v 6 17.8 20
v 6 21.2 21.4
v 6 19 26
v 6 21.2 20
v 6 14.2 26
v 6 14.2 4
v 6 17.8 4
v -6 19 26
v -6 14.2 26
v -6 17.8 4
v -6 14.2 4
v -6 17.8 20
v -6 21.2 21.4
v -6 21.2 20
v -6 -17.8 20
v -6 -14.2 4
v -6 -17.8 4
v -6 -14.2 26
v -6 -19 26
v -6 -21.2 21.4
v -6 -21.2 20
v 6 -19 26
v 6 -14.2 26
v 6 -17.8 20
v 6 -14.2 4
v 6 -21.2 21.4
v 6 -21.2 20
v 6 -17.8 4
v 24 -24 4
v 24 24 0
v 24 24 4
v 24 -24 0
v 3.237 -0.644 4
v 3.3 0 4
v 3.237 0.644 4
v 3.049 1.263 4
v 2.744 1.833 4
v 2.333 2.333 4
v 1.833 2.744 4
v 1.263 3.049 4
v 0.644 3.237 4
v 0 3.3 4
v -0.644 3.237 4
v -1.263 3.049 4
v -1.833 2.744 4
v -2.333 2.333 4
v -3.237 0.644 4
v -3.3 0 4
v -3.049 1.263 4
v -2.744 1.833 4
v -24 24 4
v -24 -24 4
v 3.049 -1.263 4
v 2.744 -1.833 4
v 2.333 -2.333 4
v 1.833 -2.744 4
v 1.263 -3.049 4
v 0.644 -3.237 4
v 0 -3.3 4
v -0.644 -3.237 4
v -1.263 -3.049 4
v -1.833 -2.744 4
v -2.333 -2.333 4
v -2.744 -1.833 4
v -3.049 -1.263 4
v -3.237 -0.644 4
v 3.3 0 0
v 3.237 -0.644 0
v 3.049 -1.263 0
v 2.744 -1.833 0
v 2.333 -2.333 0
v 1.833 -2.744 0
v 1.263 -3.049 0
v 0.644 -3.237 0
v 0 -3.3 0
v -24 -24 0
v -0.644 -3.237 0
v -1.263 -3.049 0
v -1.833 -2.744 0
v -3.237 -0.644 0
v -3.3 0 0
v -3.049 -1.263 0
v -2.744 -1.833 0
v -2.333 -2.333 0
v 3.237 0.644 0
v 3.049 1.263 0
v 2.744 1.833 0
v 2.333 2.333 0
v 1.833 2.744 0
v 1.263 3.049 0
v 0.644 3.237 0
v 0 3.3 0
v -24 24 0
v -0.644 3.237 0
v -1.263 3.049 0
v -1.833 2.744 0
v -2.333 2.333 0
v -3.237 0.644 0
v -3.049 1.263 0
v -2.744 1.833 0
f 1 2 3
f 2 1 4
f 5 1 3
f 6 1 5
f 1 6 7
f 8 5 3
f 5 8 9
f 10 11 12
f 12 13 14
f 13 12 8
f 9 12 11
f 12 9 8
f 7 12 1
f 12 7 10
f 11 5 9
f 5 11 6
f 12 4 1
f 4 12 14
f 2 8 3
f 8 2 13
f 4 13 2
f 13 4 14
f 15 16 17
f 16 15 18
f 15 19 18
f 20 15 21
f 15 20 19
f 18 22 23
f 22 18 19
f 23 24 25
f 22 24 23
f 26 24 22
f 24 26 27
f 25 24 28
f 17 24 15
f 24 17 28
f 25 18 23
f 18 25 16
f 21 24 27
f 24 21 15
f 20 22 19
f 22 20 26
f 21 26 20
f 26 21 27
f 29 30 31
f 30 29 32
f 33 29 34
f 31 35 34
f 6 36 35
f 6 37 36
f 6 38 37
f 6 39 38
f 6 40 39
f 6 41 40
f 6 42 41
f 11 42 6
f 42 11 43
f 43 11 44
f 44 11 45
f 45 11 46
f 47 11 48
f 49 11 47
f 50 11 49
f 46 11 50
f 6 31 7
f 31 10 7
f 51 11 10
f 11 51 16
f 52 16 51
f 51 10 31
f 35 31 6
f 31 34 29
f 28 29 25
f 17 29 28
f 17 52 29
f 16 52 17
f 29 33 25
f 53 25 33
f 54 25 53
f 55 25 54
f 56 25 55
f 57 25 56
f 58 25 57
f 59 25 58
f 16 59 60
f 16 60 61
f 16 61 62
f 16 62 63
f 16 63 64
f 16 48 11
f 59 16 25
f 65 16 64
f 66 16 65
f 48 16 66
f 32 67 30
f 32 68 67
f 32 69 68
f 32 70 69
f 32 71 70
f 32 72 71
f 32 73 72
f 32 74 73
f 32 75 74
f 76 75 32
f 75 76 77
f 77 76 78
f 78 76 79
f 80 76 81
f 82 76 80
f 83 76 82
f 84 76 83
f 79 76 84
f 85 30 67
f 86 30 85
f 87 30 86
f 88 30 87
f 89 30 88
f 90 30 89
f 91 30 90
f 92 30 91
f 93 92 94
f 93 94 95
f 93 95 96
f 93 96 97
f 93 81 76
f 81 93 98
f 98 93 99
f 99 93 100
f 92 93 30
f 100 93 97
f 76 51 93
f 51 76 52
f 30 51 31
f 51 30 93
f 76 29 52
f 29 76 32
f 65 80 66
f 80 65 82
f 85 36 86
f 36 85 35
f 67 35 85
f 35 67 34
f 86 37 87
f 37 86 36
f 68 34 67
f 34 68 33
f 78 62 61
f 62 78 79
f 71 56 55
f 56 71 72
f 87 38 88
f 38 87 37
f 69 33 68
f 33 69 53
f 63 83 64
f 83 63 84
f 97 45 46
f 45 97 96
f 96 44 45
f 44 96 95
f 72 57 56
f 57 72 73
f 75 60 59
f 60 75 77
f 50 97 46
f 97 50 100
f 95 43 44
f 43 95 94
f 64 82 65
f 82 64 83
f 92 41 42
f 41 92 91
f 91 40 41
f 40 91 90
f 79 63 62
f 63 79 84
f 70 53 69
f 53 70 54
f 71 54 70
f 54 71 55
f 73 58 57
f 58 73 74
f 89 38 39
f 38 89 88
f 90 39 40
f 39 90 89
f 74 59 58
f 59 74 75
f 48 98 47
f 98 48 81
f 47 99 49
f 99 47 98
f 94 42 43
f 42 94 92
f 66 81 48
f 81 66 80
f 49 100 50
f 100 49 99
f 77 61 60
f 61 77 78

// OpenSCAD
$fn = 32;

// ----------------------------------------------------------------------
// Snap-fit latch: 2 arms, 22 mm tall, 3.6 mm undercut hooks
// ----------------------------------------------------------------------

// --- parameters (mm) ---
base_d = 48;              // base plate depth
base_h = 4;               // base plate thickness
span = 32;                // distance between opposite arms
arm_t = 3.6;              // arm thickness
arm_d = 12;               // arm width
height = 22;              // free arm length
head_len = 3.6;           // hook reach
head_h = 6;               // hook height
lead = 1.4;               // lead-in ramp thickness
bore_d = 6.6;             // base fixing bore
top_z = 26;               // height of the arm tips above the base

arms = 2;

difference() {
  union() {
    /* base plate, centred on the arm ring */
    translate([-24, -24, 0]) cube([base_d, base_d, base_h]);
    for (a = [0 : 360 / arms : 359]) rotate([0, 0, a]) {
    /* arm, sunk 0.5 mm into the base */
    translate([-arm_d / 2, span / 2 - arm_t / 2, base_h - 0.5]) cube([arm_d, arm_t, height + 0.5]);
    /* hook: a convex hull of a tall inner block and a thin outer lip
       gives a flat undercut below and a lead-in ramp on top */
    hull() {
      translate([-arm_d / 2, span / 2 + arm_t / 2 - 0.6, top_z - head_h]) cube([arm_d, lead + 0.4, head_h]);
      translate([-arm_d / 2, span / 2 + arm_t / 2 - 0.2, top_z - head_h]) cube([arm_d, head_len, lead]);
    }
    }
  }
  translate([0, 0, -2.5]) cylinder(h = base_h + 5, d = bore_d);
}
